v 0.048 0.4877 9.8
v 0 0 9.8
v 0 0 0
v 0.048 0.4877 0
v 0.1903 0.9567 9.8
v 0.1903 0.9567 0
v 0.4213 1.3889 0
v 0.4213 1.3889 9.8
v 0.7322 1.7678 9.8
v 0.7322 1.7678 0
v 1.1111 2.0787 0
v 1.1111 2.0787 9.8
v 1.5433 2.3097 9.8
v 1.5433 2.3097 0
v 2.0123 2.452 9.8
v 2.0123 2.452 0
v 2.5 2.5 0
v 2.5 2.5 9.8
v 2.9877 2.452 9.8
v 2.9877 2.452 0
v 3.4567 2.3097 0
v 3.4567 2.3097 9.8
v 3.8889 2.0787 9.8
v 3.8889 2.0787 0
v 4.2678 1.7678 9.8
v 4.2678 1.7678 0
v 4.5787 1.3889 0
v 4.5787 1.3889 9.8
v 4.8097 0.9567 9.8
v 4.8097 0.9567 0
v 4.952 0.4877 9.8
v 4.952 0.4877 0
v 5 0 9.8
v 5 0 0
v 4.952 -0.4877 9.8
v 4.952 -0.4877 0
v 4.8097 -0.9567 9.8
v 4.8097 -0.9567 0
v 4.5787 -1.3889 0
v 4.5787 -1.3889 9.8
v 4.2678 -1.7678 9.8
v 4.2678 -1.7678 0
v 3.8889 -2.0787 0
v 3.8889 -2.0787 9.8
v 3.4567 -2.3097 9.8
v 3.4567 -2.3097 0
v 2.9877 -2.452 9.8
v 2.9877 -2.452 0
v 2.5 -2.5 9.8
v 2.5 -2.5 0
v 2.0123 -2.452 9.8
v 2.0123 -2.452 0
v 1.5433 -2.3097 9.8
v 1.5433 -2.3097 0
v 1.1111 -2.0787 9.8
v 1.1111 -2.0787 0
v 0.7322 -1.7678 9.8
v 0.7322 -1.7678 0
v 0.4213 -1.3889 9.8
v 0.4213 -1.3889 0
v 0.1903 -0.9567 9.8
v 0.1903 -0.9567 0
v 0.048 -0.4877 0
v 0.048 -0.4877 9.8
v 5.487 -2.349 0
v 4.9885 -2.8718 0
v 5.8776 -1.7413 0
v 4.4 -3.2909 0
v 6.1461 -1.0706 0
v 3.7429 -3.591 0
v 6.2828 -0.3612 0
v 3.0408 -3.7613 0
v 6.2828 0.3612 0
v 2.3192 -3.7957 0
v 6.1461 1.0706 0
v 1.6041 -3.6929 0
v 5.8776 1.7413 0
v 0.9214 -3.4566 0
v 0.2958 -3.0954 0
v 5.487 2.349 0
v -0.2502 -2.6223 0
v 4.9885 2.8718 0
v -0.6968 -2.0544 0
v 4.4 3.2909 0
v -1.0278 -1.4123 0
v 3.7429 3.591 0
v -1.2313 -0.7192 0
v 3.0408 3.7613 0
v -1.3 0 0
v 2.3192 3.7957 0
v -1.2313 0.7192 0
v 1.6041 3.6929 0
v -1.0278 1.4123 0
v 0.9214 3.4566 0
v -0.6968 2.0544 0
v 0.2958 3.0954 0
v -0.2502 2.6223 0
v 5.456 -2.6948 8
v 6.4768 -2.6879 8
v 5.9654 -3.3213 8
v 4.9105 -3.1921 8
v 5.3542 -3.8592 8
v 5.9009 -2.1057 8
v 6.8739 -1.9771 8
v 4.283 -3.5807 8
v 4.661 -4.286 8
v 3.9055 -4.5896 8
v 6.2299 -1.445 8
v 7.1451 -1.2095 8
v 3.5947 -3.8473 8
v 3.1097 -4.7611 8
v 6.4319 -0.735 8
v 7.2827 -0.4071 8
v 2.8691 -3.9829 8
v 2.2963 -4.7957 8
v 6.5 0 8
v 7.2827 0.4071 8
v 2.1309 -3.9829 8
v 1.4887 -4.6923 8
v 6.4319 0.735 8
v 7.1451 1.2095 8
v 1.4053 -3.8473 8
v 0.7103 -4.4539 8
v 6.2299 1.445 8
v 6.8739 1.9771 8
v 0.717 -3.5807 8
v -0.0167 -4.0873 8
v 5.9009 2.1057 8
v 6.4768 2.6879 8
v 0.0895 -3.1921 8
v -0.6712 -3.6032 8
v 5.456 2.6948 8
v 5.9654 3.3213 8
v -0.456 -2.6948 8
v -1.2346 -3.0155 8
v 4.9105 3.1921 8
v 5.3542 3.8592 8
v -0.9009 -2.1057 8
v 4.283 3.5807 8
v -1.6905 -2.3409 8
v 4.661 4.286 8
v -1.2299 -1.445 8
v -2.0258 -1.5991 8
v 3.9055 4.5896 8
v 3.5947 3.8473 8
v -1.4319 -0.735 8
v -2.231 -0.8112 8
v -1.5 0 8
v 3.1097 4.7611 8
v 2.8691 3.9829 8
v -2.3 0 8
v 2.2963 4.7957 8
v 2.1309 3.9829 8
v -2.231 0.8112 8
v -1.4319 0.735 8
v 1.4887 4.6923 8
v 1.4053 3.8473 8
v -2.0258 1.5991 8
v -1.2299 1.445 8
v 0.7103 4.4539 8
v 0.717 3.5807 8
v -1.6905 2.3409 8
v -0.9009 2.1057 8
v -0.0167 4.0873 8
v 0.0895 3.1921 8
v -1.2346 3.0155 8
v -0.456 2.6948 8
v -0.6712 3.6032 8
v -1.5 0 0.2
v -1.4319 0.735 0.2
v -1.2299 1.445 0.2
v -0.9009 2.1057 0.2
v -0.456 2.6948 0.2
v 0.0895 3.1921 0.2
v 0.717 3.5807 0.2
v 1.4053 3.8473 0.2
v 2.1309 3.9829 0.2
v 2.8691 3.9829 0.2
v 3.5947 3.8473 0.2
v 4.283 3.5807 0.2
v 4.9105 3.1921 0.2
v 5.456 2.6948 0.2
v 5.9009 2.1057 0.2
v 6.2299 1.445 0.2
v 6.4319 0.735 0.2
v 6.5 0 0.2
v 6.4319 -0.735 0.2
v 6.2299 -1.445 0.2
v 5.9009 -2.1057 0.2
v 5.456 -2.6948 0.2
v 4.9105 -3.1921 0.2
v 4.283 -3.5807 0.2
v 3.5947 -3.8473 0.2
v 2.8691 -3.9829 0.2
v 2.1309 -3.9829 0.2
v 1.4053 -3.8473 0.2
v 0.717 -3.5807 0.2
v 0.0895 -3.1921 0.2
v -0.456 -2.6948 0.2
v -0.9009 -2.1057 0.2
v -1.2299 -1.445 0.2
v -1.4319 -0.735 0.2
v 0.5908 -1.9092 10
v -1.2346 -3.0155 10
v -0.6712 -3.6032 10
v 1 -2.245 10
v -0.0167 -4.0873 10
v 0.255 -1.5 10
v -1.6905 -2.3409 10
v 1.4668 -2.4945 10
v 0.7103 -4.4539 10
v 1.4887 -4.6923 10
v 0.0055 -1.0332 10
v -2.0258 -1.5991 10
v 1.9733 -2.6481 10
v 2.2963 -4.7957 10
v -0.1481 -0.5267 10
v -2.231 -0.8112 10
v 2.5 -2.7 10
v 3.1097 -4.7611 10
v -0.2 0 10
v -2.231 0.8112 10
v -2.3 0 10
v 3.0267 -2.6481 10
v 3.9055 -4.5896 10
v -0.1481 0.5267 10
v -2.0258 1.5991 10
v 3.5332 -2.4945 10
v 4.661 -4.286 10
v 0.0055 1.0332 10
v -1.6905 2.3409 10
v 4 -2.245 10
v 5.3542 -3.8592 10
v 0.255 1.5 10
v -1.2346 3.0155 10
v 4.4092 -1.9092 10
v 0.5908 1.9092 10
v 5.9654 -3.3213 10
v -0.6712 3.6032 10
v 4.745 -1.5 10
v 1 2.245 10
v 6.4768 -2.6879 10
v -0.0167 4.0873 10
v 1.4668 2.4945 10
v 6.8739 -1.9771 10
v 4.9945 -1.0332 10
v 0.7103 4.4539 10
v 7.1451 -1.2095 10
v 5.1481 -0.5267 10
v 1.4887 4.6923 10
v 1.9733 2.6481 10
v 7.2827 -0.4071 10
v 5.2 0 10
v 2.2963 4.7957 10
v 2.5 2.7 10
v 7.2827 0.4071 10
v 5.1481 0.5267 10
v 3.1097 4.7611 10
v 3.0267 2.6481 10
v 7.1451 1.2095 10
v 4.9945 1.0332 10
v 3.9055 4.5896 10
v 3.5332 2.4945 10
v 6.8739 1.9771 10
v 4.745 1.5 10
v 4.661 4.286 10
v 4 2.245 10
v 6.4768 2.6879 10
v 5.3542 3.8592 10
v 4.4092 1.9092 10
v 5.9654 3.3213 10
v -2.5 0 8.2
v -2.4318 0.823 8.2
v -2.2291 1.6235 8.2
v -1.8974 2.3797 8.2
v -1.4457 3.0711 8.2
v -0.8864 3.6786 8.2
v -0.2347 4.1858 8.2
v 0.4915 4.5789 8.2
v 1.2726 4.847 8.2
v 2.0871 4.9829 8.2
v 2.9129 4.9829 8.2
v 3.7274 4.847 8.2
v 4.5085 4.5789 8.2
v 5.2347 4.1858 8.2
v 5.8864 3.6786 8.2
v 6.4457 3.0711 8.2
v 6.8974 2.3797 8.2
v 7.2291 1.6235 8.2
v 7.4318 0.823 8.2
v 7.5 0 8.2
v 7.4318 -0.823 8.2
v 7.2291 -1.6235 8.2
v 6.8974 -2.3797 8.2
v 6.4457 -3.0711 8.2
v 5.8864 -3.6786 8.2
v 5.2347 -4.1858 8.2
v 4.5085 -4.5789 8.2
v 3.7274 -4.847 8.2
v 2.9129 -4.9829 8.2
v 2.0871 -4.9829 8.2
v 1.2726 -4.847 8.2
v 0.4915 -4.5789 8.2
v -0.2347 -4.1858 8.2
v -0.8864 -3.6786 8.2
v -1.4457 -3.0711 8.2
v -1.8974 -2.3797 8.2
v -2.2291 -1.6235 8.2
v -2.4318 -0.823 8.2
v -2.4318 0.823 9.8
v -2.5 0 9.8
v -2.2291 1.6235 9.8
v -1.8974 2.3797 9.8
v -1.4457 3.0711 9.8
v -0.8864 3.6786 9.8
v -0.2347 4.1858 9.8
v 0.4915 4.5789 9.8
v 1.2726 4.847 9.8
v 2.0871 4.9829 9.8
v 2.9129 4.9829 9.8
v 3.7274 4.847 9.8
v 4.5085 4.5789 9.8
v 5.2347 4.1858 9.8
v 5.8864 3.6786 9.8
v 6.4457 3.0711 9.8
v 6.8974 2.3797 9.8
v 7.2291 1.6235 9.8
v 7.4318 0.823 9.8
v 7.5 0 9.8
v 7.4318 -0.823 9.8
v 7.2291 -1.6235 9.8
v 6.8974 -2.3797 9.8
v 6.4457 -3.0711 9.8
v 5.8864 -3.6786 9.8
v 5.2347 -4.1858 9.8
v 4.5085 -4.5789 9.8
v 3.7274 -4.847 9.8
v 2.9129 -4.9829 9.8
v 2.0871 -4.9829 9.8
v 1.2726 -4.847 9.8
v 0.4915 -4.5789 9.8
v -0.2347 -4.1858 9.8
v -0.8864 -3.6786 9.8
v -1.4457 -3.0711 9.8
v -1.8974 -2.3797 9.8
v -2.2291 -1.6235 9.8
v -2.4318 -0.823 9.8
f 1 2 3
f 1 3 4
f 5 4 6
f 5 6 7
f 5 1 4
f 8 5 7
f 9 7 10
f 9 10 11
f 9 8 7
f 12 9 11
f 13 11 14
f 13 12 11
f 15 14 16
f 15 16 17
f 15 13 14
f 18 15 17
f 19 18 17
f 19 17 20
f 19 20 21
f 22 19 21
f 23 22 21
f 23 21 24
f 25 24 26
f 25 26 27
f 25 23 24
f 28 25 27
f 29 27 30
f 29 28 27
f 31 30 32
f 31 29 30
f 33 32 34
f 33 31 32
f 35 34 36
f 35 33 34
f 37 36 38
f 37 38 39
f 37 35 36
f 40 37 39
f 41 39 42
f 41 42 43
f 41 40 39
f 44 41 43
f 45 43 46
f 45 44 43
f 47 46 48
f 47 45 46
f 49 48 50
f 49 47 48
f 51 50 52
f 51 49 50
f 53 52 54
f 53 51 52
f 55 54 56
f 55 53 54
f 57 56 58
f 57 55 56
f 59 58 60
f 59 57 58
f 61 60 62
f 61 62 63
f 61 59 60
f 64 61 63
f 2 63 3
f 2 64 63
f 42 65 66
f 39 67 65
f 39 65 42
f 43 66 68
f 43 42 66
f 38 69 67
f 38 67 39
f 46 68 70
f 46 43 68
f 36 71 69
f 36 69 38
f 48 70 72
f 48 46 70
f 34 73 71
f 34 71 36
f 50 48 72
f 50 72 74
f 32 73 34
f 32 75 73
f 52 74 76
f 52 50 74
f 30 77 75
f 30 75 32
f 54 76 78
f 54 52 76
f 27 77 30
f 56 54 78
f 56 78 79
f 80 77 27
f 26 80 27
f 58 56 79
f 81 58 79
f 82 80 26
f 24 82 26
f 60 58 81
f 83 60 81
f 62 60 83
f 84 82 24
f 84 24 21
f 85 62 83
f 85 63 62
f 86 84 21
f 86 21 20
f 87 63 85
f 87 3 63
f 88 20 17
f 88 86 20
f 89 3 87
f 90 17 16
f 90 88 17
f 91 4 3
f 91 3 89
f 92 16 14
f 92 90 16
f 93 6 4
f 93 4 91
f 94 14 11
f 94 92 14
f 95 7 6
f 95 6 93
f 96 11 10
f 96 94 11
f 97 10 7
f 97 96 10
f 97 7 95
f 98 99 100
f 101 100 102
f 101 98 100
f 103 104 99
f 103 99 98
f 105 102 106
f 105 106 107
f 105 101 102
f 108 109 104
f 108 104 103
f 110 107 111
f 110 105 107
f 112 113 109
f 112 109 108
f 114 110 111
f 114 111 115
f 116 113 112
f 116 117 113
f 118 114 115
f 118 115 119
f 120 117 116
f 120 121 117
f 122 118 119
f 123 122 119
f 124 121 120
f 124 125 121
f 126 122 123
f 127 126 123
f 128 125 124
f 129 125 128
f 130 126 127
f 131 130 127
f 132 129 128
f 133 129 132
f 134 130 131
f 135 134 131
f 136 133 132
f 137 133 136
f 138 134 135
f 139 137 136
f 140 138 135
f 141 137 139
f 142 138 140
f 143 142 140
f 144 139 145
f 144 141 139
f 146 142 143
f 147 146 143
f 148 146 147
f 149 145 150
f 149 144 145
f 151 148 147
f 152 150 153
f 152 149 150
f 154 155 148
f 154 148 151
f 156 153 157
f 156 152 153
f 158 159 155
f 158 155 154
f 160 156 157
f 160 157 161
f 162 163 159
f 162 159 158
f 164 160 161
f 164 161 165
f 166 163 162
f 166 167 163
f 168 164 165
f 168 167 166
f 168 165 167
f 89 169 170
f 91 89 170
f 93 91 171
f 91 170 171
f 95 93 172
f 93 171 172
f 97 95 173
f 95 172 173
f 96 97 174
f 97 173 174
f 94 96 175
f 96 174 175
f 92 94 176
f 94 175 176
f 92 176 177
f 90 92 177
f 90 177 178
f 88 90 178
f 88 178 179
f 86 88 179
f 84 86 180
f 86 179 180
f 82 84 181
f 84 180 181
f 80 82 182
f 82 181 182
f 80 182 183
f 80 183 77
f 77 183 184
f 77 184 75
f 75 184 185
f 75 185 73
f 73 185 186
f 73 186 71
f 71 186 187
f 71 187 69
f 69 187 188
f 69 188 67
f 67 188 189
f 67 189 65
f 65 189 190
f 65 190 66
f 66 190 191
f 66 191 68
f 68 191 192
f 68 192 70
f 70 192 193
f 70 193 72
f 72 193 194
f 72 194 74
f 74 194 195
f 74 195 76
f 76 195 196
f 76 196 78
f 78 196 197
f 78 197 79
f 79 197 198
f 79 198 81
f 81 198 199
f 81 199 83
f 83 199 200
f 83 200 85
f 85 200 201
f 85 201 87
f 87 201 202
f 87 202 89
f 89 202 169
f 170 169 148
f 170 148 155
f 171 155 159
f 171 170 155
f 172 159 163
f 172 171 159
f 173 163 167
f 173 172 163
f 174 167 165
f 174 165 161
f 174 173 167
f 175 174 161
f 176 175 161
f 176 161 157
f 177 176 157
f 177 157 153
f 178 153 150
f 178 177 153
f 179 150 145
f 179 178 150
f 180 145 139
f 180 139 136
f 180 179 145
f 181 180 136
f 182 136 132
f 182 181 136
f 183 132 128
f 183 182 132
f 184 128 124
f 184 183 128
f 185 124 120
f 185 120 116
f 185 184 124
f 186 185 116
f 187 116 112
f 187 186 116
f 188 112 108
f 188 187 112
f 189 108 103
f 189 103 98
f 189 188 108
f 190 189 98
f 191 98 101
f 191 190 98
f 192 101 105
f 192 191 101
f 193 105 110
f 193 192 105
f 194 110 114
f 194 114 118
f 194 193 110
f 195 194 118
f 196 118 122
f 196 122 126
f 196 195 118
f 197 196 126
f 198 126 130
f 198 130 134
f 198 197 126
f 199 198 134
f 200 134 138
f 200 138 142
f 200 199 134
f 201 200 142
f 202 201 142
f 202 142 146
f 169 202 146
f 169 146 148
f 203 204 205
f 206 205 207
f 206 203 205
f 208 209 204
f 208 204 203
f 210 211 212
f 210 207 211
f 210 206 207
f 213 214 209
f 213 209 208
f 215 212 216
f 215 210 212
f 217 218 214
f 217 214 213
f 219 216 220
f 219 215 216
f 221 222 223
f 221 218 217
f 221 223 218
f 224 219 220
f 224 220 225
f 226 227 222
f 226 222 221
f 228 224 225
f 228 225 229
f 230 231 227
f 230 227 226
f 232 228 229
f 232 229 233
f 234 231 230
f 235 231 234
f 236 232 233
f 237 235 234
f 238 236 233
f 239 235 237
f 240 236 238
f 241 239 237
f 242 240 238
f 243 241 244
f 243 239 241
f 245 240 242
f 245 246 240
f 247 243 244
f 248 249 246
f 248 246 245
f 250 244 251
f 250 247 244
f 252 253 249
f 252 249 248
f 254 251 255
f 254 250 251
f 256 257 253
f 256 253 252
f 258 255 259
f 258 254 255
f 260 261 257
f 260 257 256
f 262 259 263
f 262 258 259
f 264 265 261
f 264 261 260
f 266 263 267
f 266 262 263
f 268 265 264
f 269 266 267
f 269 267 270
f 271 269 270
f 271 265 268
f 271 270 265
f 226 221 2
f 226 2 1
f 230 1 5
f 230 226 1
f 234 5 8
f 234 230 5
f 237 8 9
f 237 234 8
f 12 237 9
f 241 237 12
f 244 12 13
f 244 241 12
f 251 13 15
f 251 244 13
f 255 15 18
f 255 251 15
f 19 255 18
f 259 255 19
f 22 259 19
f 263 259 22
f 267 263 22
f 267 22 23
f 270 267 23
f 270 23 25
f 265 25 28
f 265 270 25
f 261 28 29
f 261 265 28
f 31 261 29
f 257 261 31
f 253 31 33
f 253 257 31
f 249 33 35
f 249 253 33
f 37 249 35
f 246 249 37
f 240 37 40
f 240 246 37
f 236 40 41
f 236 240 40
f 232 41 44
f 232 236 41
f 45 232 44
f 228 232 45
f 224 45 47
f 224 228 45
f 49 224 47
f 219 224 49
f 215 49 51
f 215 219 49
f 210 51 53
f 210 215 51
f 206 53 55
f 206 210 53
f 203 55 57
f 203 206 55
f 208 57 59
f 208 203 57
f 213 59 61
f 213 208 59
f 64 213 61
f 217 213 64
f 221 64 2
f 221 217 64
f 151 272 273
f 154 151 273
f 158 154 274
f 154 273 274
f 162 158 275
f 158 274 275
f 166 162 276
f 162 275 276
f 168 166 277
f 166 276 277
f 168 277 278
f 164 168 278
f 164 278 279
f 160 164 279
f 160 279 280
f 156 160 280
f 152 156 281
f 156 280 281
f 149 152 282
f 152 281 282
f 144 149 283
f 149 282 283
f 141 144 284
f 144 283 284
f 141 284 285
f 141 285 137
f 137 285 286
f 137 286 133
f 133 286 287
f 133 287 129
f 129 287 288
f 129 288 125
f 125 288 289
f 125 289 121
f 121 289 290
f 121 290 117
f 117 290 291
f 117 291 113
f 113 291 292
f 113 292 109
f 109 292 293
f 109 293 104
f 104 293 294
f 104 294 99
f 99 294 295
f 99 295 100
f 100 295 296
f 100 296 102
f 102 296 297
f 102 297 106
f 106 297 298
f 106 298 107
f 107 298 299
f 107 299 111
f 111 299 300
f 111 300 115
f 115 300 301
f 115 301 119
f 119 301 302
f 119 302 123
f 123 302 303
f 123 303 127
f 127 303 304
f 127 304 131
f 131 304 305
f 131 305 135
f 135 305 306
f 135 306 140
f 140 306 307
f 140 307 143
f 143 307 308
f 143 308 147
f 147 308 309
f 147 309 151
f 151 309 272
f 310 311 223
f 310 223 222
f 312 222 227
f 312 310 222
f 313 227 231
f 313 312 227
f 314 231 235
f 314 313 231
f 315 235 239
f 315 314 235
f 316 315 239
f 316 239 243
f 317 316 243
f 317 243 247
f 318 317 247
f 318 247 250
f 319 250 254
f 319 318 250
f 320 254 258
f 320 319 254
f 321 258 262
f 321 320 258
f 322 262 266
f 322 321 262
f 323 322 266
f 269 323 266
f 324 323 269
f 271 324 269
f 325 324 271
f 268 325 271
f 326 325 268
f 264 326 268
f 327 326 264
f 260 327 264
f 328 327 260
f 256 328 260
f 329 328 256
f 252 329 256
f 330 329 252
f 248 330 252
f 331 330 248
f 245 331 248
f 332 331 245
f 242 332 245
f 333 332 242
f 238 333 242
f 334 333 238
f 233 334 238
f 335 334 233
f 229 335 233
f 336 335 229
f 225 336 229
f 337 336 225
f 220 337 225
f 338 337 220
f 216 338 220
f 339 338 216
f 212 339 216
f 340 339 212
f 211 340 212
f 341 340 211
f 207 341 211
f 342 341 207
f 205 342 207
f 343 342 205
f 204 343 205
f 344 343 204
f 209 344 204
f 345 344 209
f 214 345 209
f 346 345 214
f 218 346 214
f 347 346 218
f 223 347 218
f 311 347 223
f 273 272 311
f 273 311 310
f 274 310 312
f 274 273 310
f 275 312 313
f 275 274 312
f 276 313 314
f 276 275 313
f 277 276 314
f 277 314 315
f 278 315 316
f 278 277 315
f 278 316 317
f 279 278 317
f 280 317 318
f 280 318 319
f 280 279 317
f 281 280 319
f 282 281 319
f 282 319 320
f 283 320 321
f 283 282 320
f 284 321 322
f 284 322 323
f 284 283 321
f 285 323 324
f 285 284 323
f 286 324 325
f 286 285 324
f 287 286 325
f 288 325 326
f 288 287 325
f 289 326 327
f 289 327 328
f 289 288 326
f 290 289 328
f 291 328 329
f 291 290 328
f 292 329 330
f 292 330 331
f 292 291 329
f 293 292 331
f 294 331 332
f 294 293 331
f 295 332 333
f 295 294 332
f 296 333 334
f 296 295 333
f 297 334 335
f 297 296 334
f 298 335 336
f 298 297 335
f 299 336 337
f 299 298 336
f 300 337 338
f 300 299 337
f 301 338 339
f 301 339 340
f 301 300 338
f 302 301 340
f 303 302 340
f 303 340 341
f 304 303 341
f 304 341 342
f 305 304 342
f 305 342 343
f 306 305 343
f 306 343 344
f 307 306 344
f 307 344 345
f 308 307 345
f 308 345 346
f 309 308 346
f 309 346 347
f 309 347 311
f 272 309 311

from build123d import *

# Parameters (mm, degrees)
F2_SIZE = 0.2
F3_SIZE = 0.2


with BuildPart() as f1:
    # F0 (on Front) → F1 (revolve)
    with BuildSketch(Plane.XZ):
        Polygon((0, 0), (0, 10), (-2.5, 10), (-2.5, 8), (-1.5, 8), (-1.5, 0), align=None)
    revolve(axis=Axis((2.5, 0, 4.0499057987), (0, 0, -1)))

    # F2
    f2_edges = [f1.edges().sort_by_distance(p)[0] for p in [
        (5, 0, 10),
        (7.5, 0, 10),
    ]]
    chamfer(f2_edges, length=F2_SIZE)

    # F3
    f3_edges = [f1.edges().sort_by_distance(p)[0] for p in [
        (7.5, 0, 8),
        (6.5, 0, 0),
    ]]
    chamfer(f3_edges, length=F3_SIZE)


solid = f1.part
